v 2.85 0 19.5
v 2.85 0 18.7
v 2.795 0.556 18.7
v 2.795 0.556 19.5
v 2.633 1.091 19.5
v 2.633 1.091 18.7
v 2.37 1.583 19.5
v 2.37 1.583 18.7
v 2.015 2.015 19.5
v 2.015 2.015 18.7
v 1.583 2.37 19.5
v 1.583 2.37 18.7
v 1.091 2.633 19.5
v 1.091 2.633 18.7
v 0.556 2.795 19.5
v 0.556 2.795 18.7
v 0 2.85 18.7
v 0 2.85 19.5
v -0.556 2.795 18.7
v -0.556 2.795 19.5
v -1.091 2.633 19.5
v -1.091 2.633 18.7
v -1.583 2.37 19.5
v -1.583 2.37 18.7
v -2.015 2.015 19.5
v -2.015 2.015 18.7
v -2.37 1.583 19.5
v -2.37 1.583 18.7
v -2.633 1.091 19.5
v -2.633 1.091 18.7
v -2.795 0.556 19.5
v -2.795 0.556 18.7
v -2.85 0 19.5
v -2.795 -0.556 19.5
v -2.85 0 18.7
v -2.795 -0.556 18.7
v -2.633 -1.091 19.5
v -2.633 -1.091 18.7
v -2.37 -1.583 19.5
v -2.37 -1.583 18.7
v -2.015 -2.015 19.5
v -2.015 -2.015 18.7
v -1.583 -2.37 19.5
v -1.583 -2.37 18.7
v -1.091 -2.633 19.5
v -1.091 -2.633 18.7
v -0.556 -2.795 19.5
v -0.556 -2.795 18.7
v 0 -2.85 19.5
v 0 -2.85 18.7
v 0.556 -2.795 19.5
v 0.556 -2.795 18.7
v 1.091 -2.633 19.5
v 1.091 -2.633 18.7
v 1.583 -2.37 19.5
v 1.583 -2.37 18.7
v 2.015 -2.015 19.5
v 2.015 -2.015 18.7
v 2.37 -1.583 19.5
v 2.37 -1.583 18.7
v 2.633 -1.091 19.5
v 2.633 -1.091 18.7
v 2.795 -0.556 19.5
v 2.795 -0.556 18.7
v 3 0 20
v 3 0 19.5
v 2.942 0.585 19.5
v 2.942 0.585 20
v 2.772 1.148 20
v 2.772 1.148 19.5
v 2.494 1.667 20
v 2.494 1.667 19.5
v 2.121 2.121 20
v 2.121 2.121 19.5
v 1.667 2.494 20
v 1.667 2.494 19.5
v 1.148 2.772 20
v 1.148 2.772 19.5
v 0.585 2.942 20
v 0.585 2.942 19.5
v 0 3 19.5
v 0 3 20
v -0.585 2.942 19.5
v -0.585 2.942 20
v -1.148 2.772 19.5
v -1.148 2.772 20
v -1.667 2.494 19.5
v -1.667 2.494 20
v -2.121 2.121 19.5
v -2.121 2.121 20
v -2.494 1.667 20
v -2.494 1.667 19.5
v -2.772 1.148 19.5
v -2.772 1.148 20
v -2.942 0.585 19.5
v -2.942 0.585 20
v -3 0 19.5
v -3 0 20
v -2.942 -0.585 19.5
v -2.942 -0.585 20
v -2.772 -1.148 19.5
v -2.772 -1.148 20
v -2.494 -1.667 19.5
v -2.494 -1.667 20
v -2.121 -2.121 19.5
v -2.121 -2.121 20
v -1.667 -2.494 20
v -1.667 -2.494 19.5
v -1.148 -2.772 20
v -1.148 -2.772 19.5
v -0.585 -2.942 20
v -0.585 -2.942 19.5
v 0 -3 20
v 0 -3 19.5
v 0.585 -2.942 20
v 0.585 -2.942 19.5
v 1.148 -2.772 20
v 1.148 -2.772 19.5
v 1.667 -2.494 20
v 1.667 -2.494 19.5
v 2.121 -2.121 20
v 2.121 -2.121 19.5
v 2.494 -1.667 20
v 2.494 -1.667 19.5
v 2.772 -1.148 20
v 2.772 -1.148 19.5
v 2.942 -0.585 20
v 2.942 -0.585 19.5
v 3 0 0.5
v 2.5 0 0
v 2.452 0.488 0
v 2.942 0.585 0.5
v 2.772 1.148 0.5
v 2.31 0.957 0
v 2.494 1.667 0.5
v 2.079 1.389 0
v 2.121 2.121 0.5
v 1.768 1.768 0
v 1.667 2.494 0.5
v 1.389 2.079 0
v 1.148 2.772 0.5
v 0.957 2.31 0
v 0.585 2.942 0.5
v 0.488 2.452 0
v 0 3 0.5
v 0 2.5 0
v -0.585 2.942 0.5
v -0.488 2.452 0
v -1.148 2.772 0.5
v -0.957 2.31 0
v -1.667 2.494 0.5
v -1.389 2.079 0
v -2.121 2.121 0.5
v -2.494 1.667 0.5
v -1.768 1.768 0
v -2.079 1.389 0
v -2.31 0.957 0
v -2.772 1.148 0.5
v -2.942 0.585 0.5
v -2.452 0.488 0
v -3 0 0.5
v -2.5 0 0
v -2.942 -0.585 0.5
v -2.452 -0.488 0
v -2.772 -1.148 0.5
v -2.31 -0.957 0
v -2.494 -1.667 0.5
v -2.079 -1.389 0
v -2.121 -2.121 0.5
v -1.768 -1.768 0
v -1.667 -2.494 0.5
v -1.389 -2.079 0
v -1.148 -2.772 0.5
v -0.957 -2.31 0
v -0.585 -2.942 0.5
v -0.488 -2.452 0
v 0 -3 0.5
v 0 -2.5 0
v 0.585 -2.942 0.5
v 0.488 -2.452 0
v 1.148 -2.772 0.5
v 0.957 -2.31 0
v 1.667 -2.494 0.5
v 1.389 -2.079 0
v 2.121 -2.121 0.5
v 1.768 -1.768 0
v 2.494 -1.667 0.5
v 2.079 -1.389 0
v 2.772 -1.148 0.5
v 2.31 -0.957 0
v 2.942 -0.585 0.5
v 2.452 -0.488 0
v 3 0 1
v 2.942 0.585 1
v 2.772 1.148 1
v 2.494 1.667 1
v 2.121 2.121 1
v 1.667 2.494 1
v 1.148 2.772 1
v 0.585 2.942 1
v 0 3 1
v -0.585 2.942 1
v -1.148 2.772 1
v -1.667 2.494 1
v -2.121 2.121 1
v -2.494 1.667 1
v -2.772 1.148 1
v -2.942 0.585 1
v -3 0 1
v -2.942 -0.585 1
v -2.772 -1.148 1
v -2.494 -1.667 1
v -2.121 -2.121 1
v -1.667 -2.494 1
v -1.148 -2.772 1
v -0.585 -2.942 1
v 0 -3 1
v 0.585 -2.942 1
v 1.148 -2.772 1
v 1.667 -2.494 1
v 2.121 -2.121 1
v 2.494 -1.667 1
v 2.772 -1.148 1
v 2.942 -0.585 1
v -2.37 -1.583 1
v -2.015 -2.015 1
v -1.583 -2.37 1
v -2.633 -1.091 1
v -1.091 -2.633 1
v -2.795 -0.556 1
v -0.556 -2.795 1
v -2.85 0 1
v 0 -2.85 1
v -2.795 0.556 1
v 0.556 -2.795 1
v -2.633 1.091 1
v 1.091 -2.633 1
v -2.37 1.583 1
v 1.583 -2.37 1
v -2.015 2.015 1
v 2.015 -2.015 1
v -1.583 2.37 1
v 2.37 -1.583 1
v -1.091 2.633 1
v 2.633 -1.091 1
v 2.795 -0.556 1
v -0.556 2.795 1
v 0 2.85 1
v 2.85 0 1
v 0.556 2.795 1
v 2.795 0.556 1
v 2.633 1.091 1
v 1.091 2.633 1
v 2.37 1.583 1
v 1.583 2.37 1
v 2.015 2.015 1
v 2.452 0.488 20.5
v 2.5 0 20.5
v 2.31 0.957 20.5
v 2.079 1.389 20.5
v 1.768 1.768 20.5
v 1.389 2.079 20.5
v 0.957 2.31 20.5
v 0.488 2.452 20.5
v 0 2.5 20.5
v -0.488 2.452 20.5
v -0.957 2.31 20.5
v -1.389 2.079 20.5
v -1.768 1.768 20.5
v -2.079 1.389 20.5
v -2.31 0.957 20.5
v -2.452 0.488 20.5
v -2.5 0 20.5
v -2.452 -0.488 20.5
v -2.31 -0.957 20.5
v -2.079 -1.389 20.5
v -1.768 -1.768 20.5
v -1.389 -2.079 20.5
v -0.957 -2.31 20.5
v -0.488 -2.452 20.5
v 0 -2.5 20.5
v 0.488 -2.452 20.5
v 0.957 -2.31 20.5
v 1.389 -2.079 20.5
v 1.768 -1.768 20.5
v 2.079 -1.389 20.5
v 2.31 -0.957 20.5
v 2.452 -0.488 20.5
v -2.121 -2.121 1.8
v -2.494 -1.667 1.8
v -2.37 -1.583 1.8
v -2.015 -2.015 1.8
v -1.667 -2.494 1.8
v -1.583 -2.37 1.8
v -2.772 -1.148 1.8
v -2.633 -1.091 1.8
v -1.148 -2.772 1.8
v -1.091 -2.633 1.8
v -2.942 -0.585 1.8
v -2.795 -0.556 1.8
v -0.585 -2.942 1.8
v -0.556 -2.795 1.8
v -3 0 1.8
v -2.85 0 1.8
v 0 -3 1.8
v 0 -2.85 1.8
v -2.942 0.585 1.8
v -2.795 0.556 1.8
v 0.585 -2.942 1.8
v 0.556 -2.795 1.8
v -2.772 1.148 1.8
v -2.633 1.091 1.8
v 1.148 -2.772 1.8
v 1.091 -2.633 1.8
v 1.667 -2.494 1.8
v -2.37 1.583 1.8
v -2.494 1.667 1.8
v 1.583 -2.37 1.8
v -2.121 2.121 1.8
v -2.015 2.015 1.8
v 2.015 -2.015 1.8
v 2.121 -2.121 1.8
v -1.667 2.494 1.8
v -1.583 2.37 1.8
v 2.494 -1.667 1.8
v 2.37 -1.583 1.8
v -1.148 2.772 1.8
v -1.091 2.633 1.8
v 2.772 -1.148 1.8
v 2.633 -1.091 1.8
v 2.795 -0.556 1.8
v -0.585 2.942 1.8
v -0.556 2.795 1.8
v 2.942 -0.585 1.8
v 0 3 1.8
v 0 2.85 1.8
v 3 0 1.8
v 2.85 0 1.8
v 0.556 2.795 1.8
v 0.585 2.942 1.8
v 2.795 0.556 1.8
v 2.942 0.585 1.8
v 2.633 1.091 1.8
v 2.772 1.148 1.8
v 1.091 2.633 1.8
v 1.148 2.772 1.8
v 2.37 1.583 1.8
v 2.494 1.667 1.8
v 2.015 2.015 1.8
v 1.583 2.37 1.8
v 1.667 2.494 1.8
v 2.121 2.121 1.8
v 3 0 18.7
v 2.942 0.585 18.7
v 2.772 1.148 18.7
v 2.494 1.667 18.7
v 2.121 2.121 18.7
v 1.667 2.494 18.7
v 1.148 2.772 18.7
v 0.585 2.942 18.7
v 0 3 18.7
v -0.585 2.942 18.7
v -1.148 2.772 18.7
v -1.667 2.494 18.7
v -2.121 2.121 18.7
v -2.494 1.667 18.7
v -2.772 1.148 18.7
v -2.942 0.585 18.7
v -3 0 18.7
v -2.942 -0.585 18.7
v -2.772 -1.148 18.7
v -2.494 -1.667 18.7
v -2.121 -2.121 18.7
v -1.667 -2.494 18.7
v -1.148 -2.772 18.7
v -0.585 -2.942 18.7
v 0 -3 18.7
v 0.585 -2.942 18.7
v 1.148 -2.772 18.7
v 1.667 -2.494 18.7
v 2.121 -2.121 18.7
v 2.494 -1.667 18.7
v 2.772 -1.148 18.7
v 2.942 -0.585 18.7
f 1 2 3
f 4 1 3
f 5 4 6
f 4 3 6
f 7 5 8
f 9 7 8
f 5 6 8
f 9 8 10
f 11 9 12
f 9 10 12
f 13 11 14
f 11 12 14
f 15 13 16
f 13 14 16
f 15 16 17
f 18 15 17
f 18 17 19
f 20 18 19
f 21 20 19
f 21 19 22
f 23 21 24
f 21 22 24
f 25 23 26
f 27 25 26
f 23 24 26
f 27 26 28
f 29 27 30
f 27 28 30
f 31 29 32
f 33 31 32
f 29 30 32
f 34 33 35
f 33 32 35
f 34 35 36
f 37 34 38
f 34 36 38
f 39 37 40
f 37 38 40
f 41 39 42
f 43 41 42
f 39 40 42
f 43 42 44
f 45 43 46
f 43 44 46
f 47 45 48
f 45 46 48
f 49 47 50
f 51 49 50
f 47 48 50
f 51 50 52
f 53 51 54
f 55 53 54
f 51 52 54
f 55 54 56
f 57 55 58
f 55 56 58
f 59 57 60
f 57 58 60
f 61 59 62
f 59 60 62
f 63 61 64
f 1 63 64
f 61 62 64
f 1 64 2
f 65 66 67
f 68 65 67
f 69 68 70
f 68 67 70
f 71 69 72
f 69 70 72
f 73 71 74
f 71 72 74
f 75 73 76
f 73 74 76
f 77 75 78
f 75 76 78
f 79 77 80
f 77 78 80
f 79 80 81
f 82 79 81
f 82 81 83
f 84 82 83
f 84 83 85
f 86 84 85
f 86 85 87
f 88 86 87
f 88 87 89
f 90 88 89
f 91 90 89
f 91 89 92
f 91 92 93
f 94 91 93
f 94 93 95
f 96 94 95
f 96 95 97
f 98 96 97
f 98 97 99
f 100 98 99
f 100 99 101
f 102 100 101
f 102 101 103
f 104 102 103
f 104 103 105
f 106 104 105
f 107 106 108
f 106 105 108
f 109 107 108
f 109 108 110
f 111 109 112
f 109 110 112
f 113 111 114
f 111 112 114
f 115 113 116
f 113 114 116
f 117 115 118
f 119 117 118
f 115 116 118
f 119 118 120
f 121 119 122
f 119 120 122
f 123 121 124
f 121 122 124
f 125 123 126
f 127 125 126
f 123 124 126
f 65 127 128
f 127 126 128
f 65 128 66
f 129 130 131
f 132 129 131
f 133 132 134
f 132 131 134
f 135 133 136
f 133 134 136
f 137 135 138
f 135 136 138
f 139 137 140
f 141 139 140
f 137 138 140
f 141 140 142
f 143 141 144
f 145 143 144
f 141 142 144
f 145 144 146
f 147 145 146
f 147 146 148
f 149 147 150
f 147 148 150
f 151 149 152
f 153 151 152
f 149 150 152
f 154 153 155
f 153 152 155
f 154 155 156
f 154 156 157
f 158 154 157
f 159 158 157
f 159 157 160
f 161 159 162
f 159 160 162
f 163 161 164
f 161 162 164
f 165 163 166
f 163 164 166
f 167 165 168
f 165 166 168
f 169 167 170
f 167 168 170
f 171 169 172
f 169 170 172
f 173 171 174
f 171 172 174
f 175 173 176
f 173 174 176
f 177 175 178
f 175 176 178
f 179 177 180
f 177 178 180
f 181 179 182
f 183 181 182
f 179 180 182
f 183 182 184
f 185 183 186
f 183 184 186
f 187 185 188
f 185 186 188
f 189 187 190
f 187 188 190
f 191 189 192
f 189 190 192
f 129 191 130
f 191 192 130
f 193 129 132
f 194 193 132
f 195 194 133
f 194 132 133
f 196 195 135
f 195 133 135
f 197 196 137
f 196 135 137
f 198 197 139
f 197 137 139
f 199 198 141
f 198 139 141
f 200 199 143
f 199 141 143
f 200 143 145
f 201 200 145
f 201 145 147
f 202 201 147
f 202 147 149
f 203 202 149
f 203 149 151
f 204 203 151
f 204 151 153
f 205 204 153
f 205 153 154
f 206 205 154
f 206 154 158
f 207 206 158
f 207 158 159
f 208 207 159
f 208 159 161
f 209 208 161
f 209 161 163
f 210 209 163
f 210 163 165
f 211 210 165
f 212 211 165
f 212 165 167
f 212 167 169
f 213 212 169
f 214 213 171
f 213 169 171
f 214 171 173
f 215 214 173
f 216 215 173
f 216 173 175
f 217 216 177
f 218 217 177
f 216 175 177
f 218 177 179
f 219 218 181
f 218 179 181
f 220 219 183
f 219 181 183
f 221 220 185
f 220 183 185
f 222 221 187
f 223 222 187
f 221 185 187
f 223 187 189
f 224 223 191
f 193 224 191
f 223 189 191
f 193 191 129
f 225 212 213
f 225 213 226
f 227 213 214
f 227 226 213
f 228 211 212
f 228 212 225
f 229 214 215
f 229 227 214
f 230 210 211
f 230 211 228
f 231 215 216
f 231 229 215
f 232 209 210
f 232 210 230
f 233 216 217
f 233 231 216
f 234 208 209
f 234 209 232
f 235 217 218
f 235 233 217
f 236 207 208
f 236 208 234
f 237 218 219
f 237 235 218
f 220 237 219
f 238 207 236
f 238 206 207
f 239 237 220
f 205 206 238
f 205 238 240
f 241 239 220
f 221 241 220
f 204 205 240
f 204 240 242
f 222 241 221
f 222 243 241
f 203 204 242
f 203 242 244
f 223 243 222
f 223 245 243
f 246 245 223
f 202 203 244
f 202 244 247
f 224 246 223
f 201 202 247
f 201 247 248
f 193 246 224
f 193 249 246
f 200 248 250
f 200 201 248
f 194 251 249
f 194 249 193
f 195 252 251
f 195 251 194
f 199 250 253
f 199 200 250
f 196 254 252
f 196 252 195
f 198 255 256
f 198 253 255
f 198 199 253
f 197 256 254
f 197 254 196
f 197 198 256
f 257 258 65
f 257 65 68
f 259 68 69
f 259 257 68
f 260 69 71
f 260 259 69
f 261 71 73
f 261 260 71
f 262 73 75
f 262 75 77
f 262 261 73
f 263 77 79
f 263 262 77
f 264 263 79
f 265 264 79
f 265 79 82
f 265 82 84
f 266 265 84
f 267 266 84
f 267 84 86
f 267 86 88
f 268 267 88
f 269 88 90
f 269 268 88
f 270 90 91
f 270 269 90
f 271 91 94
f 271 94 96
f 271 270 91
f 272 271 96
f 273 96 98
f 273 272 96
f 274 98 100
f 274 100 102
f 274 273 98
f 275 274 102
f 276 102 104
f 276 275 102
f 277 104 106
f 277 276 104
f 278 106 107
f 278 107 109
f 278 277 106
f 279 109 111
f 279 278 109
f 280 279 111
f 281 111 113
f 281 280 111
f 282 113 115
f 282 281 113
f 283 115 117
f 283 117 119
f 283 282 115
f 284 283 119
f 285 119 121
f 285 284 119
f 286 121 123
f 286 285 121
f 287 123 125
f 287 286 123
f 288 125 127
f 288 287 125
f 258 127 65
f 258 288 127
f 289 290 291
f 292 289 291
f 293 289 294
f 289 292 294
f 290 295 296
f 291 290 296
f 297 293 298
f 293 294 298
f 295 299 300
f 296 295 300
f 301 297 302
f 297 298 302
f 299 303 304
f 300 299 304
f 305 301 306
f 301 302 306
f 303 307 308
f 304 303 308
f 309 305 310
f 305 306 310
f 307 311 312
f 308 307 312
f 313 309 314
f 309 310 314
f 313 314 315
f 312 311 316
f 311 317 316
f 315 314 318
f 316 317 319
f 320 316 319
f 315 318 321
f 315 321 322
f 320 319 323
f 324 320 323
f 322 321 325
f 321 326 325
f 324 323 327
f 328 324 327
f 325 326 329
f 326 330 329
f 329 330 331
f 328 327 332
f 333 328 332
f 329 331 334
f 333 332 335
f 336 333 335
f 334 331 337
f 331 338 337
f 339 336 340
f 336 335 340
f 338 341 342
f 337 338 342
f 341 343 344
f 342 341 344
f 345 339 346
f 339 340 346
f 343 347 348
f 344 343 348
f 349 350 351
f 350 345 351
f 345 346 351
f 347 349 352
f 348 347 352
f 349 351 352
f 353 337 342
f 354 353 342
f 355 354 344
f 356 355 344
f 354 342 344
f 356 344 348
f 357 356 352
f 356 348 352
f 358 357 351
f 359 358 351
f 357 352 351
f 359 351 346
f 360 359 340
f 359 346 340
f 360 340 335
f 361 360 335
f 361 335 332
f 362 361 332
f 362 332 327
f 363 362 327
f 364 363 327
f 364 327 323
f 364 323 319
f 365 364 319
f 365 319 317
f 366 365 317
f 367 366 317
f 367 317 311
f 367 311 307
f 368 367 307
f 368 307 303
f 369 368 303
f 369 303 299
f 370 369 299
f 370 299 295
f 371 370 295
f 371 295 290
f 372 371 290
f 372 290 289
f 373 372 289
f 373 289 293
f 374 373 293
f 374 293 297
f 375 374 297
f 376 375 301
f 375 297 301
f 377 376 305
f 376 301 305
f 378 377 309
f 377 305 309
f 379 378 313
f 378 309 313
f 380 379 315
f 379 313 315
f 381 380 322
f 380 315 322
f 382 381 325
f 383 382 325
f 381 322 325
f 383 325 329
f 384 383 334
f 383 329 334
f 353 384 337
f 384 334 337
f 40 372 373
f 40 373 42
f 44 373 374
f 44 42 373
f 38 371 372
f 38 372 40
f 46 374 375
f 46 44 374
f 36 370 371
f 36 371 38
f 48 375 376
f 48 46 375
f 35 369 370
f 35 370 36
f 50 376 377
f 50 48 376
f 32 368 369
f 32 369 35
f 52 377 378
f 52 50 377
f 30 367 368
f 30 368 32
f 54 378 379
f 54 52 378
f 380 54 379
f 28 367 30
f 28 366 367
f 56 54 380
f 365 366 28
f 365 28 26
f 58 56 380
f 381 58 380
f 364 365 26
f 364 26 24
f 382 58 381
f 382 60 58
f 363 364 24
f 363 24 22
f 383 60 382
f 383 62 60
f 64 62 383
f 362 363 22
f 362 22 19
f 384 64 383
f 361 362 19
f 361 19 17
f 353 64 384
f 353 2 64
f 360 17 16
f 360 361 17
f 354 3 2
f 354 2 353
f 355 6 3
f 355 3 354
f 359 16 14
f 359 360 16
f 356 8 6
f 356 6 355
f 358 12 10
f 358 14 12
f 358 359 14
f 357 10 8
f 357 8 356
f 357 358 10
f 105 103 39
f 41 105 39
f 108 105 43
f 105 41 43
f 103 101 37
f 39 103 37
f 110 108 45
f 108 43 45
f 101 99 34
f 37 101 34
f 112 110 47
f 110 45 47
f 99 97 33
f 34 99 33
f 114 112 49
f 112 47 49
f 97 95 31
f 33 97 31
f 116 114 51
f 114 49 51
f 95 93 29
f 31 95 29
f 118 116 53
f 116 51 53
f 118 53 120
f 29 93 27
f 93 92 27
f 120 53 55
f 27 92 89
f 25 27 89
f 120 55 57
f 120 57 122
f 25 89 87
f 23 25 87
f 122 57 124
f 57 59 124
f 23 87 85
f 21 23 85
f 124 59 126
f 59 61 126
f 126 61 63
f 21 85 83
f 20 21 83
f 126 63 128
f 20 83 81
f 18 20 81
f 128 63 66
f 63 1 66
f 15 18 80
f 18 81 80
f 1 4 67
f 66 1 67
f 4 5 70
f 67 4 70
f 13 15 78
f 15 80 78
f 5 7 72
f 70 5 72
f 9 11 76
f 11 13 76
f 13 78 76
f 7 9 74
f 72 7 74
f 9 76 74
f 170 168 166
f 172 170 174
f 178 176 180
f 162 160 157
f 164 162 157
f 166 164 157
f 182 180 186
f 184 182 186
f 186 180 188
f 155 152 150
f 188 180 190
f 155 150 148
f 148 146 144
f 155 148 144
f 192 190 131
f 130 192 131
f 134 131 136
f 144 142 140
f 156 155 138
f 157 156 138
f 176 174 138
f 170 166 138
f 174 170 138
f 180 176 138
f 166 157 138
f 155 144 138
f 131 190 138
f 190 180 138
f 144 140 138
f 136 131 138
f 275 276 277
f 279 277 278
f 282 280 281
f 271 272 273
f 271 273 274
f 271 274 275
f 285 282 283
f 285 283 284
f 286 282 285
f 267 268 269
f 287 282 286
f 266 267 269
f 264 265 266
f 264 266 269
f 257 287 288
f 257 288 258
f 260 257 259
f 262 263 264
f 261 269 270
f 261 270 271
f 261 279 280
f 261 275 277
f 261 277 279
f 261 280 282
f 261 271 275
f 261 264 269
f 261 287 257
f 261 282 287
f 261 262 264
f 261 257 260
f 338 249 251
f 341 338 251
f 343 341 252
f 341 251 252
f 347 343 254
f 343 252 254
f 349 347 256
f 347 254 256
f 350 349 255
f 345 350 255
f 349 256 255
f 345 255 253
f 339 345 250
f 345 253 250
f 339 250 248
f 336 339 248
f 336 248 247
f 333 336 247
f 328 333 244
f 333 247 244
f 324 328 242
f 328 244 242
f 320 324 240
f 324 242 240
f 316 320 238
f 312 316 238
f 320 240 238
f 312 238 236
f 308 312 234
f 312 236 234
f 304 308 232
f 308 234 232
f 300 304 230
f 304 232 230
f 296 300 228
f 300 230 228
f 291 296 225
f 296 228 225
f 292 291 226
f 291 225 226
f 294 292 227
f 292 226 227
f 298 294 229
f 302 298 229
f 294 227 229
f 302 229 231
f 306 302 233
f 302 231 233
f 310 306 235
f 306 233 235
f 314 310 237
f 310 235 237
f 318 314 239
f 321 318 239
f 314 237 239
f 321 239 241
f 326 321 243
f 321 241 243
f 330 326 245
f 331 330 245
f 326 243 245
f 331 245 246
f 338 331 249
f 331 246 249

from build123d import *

# Parameters (mm, degrees)
SZKIC1_R                    = 3
DODANIE_WYCI_GNI_CIE1_DEPTH = 20.5
WYTNIJ_WYCI_GNI_CIE1_START  = -1.8
SZKIC2_R                    = 3
SZKIC2_R_2                  = 2.85
WYTNIJ_WYCI_GNI_CIE1_DEPTH  = 0.8
WYTNIJ_WYCI_GNI_CIE2_START  = -19.5
SZKIC2_2_R                  = 3
SZKIC2_2_R_2                = 2.85
WYTNIJ_WYCI_GNI_CIE2_DEPTH  = 0.8
SFAZOWANIE1_SIZE            = 0.5


with BuildPart() as part:
    # Szkic1 → Dodanie-wyciągnięcie1 (new body)
    with BuildSketch(Plane.XY):
        Circle(SZKIC1_R)
    extrude(amount=DODANIE_WYCI_GNI_CIE1_DEPTH)

    # Szkic2 → Wytnij-wyciągnięcie1 (cut)
    with BuildSketch(Plane.XY.offset(20.5).offset(WYTNIJ_WYCI_GNI_CIE1_START)):
        Circle(SZKIC2_R)
        Circle(SZKIC2_R_2, mode=Mode.SUBTRACT)
    extrude(amount=WYTNIJ_WYCI_GNI_CIE1_DEPTH, mode=Mode.SUBTRACT)

    # Szkic2<2> → Wytnij-wyciągnięcie2 (cut)
    with BuildSketch(Plane.XY.offset(20.5).offset(WYTNIJ_WYCI_GNI_CIE2_START)):
        Circle(SZKIC2_2_R)
        Circle(SZKIC2_2_R_2, mode=Mode.SUBTRACT)
    extrude(amount=WYTNIJ_WYCI_GNI_CIE2_DEPTH, mode=Mode.SUBTRACT)

    # Sfazowanie1
    sfazowanie1_edges = [part.edges().sort_by_distance(p)[0] for p in [
        (-3, 0, 0),
        (-3, 0, 20.5),
    ]]
    chamfer(sfazowanie1_edges, length=SFAZOWANIE1_SIZE)


solid = part.part
